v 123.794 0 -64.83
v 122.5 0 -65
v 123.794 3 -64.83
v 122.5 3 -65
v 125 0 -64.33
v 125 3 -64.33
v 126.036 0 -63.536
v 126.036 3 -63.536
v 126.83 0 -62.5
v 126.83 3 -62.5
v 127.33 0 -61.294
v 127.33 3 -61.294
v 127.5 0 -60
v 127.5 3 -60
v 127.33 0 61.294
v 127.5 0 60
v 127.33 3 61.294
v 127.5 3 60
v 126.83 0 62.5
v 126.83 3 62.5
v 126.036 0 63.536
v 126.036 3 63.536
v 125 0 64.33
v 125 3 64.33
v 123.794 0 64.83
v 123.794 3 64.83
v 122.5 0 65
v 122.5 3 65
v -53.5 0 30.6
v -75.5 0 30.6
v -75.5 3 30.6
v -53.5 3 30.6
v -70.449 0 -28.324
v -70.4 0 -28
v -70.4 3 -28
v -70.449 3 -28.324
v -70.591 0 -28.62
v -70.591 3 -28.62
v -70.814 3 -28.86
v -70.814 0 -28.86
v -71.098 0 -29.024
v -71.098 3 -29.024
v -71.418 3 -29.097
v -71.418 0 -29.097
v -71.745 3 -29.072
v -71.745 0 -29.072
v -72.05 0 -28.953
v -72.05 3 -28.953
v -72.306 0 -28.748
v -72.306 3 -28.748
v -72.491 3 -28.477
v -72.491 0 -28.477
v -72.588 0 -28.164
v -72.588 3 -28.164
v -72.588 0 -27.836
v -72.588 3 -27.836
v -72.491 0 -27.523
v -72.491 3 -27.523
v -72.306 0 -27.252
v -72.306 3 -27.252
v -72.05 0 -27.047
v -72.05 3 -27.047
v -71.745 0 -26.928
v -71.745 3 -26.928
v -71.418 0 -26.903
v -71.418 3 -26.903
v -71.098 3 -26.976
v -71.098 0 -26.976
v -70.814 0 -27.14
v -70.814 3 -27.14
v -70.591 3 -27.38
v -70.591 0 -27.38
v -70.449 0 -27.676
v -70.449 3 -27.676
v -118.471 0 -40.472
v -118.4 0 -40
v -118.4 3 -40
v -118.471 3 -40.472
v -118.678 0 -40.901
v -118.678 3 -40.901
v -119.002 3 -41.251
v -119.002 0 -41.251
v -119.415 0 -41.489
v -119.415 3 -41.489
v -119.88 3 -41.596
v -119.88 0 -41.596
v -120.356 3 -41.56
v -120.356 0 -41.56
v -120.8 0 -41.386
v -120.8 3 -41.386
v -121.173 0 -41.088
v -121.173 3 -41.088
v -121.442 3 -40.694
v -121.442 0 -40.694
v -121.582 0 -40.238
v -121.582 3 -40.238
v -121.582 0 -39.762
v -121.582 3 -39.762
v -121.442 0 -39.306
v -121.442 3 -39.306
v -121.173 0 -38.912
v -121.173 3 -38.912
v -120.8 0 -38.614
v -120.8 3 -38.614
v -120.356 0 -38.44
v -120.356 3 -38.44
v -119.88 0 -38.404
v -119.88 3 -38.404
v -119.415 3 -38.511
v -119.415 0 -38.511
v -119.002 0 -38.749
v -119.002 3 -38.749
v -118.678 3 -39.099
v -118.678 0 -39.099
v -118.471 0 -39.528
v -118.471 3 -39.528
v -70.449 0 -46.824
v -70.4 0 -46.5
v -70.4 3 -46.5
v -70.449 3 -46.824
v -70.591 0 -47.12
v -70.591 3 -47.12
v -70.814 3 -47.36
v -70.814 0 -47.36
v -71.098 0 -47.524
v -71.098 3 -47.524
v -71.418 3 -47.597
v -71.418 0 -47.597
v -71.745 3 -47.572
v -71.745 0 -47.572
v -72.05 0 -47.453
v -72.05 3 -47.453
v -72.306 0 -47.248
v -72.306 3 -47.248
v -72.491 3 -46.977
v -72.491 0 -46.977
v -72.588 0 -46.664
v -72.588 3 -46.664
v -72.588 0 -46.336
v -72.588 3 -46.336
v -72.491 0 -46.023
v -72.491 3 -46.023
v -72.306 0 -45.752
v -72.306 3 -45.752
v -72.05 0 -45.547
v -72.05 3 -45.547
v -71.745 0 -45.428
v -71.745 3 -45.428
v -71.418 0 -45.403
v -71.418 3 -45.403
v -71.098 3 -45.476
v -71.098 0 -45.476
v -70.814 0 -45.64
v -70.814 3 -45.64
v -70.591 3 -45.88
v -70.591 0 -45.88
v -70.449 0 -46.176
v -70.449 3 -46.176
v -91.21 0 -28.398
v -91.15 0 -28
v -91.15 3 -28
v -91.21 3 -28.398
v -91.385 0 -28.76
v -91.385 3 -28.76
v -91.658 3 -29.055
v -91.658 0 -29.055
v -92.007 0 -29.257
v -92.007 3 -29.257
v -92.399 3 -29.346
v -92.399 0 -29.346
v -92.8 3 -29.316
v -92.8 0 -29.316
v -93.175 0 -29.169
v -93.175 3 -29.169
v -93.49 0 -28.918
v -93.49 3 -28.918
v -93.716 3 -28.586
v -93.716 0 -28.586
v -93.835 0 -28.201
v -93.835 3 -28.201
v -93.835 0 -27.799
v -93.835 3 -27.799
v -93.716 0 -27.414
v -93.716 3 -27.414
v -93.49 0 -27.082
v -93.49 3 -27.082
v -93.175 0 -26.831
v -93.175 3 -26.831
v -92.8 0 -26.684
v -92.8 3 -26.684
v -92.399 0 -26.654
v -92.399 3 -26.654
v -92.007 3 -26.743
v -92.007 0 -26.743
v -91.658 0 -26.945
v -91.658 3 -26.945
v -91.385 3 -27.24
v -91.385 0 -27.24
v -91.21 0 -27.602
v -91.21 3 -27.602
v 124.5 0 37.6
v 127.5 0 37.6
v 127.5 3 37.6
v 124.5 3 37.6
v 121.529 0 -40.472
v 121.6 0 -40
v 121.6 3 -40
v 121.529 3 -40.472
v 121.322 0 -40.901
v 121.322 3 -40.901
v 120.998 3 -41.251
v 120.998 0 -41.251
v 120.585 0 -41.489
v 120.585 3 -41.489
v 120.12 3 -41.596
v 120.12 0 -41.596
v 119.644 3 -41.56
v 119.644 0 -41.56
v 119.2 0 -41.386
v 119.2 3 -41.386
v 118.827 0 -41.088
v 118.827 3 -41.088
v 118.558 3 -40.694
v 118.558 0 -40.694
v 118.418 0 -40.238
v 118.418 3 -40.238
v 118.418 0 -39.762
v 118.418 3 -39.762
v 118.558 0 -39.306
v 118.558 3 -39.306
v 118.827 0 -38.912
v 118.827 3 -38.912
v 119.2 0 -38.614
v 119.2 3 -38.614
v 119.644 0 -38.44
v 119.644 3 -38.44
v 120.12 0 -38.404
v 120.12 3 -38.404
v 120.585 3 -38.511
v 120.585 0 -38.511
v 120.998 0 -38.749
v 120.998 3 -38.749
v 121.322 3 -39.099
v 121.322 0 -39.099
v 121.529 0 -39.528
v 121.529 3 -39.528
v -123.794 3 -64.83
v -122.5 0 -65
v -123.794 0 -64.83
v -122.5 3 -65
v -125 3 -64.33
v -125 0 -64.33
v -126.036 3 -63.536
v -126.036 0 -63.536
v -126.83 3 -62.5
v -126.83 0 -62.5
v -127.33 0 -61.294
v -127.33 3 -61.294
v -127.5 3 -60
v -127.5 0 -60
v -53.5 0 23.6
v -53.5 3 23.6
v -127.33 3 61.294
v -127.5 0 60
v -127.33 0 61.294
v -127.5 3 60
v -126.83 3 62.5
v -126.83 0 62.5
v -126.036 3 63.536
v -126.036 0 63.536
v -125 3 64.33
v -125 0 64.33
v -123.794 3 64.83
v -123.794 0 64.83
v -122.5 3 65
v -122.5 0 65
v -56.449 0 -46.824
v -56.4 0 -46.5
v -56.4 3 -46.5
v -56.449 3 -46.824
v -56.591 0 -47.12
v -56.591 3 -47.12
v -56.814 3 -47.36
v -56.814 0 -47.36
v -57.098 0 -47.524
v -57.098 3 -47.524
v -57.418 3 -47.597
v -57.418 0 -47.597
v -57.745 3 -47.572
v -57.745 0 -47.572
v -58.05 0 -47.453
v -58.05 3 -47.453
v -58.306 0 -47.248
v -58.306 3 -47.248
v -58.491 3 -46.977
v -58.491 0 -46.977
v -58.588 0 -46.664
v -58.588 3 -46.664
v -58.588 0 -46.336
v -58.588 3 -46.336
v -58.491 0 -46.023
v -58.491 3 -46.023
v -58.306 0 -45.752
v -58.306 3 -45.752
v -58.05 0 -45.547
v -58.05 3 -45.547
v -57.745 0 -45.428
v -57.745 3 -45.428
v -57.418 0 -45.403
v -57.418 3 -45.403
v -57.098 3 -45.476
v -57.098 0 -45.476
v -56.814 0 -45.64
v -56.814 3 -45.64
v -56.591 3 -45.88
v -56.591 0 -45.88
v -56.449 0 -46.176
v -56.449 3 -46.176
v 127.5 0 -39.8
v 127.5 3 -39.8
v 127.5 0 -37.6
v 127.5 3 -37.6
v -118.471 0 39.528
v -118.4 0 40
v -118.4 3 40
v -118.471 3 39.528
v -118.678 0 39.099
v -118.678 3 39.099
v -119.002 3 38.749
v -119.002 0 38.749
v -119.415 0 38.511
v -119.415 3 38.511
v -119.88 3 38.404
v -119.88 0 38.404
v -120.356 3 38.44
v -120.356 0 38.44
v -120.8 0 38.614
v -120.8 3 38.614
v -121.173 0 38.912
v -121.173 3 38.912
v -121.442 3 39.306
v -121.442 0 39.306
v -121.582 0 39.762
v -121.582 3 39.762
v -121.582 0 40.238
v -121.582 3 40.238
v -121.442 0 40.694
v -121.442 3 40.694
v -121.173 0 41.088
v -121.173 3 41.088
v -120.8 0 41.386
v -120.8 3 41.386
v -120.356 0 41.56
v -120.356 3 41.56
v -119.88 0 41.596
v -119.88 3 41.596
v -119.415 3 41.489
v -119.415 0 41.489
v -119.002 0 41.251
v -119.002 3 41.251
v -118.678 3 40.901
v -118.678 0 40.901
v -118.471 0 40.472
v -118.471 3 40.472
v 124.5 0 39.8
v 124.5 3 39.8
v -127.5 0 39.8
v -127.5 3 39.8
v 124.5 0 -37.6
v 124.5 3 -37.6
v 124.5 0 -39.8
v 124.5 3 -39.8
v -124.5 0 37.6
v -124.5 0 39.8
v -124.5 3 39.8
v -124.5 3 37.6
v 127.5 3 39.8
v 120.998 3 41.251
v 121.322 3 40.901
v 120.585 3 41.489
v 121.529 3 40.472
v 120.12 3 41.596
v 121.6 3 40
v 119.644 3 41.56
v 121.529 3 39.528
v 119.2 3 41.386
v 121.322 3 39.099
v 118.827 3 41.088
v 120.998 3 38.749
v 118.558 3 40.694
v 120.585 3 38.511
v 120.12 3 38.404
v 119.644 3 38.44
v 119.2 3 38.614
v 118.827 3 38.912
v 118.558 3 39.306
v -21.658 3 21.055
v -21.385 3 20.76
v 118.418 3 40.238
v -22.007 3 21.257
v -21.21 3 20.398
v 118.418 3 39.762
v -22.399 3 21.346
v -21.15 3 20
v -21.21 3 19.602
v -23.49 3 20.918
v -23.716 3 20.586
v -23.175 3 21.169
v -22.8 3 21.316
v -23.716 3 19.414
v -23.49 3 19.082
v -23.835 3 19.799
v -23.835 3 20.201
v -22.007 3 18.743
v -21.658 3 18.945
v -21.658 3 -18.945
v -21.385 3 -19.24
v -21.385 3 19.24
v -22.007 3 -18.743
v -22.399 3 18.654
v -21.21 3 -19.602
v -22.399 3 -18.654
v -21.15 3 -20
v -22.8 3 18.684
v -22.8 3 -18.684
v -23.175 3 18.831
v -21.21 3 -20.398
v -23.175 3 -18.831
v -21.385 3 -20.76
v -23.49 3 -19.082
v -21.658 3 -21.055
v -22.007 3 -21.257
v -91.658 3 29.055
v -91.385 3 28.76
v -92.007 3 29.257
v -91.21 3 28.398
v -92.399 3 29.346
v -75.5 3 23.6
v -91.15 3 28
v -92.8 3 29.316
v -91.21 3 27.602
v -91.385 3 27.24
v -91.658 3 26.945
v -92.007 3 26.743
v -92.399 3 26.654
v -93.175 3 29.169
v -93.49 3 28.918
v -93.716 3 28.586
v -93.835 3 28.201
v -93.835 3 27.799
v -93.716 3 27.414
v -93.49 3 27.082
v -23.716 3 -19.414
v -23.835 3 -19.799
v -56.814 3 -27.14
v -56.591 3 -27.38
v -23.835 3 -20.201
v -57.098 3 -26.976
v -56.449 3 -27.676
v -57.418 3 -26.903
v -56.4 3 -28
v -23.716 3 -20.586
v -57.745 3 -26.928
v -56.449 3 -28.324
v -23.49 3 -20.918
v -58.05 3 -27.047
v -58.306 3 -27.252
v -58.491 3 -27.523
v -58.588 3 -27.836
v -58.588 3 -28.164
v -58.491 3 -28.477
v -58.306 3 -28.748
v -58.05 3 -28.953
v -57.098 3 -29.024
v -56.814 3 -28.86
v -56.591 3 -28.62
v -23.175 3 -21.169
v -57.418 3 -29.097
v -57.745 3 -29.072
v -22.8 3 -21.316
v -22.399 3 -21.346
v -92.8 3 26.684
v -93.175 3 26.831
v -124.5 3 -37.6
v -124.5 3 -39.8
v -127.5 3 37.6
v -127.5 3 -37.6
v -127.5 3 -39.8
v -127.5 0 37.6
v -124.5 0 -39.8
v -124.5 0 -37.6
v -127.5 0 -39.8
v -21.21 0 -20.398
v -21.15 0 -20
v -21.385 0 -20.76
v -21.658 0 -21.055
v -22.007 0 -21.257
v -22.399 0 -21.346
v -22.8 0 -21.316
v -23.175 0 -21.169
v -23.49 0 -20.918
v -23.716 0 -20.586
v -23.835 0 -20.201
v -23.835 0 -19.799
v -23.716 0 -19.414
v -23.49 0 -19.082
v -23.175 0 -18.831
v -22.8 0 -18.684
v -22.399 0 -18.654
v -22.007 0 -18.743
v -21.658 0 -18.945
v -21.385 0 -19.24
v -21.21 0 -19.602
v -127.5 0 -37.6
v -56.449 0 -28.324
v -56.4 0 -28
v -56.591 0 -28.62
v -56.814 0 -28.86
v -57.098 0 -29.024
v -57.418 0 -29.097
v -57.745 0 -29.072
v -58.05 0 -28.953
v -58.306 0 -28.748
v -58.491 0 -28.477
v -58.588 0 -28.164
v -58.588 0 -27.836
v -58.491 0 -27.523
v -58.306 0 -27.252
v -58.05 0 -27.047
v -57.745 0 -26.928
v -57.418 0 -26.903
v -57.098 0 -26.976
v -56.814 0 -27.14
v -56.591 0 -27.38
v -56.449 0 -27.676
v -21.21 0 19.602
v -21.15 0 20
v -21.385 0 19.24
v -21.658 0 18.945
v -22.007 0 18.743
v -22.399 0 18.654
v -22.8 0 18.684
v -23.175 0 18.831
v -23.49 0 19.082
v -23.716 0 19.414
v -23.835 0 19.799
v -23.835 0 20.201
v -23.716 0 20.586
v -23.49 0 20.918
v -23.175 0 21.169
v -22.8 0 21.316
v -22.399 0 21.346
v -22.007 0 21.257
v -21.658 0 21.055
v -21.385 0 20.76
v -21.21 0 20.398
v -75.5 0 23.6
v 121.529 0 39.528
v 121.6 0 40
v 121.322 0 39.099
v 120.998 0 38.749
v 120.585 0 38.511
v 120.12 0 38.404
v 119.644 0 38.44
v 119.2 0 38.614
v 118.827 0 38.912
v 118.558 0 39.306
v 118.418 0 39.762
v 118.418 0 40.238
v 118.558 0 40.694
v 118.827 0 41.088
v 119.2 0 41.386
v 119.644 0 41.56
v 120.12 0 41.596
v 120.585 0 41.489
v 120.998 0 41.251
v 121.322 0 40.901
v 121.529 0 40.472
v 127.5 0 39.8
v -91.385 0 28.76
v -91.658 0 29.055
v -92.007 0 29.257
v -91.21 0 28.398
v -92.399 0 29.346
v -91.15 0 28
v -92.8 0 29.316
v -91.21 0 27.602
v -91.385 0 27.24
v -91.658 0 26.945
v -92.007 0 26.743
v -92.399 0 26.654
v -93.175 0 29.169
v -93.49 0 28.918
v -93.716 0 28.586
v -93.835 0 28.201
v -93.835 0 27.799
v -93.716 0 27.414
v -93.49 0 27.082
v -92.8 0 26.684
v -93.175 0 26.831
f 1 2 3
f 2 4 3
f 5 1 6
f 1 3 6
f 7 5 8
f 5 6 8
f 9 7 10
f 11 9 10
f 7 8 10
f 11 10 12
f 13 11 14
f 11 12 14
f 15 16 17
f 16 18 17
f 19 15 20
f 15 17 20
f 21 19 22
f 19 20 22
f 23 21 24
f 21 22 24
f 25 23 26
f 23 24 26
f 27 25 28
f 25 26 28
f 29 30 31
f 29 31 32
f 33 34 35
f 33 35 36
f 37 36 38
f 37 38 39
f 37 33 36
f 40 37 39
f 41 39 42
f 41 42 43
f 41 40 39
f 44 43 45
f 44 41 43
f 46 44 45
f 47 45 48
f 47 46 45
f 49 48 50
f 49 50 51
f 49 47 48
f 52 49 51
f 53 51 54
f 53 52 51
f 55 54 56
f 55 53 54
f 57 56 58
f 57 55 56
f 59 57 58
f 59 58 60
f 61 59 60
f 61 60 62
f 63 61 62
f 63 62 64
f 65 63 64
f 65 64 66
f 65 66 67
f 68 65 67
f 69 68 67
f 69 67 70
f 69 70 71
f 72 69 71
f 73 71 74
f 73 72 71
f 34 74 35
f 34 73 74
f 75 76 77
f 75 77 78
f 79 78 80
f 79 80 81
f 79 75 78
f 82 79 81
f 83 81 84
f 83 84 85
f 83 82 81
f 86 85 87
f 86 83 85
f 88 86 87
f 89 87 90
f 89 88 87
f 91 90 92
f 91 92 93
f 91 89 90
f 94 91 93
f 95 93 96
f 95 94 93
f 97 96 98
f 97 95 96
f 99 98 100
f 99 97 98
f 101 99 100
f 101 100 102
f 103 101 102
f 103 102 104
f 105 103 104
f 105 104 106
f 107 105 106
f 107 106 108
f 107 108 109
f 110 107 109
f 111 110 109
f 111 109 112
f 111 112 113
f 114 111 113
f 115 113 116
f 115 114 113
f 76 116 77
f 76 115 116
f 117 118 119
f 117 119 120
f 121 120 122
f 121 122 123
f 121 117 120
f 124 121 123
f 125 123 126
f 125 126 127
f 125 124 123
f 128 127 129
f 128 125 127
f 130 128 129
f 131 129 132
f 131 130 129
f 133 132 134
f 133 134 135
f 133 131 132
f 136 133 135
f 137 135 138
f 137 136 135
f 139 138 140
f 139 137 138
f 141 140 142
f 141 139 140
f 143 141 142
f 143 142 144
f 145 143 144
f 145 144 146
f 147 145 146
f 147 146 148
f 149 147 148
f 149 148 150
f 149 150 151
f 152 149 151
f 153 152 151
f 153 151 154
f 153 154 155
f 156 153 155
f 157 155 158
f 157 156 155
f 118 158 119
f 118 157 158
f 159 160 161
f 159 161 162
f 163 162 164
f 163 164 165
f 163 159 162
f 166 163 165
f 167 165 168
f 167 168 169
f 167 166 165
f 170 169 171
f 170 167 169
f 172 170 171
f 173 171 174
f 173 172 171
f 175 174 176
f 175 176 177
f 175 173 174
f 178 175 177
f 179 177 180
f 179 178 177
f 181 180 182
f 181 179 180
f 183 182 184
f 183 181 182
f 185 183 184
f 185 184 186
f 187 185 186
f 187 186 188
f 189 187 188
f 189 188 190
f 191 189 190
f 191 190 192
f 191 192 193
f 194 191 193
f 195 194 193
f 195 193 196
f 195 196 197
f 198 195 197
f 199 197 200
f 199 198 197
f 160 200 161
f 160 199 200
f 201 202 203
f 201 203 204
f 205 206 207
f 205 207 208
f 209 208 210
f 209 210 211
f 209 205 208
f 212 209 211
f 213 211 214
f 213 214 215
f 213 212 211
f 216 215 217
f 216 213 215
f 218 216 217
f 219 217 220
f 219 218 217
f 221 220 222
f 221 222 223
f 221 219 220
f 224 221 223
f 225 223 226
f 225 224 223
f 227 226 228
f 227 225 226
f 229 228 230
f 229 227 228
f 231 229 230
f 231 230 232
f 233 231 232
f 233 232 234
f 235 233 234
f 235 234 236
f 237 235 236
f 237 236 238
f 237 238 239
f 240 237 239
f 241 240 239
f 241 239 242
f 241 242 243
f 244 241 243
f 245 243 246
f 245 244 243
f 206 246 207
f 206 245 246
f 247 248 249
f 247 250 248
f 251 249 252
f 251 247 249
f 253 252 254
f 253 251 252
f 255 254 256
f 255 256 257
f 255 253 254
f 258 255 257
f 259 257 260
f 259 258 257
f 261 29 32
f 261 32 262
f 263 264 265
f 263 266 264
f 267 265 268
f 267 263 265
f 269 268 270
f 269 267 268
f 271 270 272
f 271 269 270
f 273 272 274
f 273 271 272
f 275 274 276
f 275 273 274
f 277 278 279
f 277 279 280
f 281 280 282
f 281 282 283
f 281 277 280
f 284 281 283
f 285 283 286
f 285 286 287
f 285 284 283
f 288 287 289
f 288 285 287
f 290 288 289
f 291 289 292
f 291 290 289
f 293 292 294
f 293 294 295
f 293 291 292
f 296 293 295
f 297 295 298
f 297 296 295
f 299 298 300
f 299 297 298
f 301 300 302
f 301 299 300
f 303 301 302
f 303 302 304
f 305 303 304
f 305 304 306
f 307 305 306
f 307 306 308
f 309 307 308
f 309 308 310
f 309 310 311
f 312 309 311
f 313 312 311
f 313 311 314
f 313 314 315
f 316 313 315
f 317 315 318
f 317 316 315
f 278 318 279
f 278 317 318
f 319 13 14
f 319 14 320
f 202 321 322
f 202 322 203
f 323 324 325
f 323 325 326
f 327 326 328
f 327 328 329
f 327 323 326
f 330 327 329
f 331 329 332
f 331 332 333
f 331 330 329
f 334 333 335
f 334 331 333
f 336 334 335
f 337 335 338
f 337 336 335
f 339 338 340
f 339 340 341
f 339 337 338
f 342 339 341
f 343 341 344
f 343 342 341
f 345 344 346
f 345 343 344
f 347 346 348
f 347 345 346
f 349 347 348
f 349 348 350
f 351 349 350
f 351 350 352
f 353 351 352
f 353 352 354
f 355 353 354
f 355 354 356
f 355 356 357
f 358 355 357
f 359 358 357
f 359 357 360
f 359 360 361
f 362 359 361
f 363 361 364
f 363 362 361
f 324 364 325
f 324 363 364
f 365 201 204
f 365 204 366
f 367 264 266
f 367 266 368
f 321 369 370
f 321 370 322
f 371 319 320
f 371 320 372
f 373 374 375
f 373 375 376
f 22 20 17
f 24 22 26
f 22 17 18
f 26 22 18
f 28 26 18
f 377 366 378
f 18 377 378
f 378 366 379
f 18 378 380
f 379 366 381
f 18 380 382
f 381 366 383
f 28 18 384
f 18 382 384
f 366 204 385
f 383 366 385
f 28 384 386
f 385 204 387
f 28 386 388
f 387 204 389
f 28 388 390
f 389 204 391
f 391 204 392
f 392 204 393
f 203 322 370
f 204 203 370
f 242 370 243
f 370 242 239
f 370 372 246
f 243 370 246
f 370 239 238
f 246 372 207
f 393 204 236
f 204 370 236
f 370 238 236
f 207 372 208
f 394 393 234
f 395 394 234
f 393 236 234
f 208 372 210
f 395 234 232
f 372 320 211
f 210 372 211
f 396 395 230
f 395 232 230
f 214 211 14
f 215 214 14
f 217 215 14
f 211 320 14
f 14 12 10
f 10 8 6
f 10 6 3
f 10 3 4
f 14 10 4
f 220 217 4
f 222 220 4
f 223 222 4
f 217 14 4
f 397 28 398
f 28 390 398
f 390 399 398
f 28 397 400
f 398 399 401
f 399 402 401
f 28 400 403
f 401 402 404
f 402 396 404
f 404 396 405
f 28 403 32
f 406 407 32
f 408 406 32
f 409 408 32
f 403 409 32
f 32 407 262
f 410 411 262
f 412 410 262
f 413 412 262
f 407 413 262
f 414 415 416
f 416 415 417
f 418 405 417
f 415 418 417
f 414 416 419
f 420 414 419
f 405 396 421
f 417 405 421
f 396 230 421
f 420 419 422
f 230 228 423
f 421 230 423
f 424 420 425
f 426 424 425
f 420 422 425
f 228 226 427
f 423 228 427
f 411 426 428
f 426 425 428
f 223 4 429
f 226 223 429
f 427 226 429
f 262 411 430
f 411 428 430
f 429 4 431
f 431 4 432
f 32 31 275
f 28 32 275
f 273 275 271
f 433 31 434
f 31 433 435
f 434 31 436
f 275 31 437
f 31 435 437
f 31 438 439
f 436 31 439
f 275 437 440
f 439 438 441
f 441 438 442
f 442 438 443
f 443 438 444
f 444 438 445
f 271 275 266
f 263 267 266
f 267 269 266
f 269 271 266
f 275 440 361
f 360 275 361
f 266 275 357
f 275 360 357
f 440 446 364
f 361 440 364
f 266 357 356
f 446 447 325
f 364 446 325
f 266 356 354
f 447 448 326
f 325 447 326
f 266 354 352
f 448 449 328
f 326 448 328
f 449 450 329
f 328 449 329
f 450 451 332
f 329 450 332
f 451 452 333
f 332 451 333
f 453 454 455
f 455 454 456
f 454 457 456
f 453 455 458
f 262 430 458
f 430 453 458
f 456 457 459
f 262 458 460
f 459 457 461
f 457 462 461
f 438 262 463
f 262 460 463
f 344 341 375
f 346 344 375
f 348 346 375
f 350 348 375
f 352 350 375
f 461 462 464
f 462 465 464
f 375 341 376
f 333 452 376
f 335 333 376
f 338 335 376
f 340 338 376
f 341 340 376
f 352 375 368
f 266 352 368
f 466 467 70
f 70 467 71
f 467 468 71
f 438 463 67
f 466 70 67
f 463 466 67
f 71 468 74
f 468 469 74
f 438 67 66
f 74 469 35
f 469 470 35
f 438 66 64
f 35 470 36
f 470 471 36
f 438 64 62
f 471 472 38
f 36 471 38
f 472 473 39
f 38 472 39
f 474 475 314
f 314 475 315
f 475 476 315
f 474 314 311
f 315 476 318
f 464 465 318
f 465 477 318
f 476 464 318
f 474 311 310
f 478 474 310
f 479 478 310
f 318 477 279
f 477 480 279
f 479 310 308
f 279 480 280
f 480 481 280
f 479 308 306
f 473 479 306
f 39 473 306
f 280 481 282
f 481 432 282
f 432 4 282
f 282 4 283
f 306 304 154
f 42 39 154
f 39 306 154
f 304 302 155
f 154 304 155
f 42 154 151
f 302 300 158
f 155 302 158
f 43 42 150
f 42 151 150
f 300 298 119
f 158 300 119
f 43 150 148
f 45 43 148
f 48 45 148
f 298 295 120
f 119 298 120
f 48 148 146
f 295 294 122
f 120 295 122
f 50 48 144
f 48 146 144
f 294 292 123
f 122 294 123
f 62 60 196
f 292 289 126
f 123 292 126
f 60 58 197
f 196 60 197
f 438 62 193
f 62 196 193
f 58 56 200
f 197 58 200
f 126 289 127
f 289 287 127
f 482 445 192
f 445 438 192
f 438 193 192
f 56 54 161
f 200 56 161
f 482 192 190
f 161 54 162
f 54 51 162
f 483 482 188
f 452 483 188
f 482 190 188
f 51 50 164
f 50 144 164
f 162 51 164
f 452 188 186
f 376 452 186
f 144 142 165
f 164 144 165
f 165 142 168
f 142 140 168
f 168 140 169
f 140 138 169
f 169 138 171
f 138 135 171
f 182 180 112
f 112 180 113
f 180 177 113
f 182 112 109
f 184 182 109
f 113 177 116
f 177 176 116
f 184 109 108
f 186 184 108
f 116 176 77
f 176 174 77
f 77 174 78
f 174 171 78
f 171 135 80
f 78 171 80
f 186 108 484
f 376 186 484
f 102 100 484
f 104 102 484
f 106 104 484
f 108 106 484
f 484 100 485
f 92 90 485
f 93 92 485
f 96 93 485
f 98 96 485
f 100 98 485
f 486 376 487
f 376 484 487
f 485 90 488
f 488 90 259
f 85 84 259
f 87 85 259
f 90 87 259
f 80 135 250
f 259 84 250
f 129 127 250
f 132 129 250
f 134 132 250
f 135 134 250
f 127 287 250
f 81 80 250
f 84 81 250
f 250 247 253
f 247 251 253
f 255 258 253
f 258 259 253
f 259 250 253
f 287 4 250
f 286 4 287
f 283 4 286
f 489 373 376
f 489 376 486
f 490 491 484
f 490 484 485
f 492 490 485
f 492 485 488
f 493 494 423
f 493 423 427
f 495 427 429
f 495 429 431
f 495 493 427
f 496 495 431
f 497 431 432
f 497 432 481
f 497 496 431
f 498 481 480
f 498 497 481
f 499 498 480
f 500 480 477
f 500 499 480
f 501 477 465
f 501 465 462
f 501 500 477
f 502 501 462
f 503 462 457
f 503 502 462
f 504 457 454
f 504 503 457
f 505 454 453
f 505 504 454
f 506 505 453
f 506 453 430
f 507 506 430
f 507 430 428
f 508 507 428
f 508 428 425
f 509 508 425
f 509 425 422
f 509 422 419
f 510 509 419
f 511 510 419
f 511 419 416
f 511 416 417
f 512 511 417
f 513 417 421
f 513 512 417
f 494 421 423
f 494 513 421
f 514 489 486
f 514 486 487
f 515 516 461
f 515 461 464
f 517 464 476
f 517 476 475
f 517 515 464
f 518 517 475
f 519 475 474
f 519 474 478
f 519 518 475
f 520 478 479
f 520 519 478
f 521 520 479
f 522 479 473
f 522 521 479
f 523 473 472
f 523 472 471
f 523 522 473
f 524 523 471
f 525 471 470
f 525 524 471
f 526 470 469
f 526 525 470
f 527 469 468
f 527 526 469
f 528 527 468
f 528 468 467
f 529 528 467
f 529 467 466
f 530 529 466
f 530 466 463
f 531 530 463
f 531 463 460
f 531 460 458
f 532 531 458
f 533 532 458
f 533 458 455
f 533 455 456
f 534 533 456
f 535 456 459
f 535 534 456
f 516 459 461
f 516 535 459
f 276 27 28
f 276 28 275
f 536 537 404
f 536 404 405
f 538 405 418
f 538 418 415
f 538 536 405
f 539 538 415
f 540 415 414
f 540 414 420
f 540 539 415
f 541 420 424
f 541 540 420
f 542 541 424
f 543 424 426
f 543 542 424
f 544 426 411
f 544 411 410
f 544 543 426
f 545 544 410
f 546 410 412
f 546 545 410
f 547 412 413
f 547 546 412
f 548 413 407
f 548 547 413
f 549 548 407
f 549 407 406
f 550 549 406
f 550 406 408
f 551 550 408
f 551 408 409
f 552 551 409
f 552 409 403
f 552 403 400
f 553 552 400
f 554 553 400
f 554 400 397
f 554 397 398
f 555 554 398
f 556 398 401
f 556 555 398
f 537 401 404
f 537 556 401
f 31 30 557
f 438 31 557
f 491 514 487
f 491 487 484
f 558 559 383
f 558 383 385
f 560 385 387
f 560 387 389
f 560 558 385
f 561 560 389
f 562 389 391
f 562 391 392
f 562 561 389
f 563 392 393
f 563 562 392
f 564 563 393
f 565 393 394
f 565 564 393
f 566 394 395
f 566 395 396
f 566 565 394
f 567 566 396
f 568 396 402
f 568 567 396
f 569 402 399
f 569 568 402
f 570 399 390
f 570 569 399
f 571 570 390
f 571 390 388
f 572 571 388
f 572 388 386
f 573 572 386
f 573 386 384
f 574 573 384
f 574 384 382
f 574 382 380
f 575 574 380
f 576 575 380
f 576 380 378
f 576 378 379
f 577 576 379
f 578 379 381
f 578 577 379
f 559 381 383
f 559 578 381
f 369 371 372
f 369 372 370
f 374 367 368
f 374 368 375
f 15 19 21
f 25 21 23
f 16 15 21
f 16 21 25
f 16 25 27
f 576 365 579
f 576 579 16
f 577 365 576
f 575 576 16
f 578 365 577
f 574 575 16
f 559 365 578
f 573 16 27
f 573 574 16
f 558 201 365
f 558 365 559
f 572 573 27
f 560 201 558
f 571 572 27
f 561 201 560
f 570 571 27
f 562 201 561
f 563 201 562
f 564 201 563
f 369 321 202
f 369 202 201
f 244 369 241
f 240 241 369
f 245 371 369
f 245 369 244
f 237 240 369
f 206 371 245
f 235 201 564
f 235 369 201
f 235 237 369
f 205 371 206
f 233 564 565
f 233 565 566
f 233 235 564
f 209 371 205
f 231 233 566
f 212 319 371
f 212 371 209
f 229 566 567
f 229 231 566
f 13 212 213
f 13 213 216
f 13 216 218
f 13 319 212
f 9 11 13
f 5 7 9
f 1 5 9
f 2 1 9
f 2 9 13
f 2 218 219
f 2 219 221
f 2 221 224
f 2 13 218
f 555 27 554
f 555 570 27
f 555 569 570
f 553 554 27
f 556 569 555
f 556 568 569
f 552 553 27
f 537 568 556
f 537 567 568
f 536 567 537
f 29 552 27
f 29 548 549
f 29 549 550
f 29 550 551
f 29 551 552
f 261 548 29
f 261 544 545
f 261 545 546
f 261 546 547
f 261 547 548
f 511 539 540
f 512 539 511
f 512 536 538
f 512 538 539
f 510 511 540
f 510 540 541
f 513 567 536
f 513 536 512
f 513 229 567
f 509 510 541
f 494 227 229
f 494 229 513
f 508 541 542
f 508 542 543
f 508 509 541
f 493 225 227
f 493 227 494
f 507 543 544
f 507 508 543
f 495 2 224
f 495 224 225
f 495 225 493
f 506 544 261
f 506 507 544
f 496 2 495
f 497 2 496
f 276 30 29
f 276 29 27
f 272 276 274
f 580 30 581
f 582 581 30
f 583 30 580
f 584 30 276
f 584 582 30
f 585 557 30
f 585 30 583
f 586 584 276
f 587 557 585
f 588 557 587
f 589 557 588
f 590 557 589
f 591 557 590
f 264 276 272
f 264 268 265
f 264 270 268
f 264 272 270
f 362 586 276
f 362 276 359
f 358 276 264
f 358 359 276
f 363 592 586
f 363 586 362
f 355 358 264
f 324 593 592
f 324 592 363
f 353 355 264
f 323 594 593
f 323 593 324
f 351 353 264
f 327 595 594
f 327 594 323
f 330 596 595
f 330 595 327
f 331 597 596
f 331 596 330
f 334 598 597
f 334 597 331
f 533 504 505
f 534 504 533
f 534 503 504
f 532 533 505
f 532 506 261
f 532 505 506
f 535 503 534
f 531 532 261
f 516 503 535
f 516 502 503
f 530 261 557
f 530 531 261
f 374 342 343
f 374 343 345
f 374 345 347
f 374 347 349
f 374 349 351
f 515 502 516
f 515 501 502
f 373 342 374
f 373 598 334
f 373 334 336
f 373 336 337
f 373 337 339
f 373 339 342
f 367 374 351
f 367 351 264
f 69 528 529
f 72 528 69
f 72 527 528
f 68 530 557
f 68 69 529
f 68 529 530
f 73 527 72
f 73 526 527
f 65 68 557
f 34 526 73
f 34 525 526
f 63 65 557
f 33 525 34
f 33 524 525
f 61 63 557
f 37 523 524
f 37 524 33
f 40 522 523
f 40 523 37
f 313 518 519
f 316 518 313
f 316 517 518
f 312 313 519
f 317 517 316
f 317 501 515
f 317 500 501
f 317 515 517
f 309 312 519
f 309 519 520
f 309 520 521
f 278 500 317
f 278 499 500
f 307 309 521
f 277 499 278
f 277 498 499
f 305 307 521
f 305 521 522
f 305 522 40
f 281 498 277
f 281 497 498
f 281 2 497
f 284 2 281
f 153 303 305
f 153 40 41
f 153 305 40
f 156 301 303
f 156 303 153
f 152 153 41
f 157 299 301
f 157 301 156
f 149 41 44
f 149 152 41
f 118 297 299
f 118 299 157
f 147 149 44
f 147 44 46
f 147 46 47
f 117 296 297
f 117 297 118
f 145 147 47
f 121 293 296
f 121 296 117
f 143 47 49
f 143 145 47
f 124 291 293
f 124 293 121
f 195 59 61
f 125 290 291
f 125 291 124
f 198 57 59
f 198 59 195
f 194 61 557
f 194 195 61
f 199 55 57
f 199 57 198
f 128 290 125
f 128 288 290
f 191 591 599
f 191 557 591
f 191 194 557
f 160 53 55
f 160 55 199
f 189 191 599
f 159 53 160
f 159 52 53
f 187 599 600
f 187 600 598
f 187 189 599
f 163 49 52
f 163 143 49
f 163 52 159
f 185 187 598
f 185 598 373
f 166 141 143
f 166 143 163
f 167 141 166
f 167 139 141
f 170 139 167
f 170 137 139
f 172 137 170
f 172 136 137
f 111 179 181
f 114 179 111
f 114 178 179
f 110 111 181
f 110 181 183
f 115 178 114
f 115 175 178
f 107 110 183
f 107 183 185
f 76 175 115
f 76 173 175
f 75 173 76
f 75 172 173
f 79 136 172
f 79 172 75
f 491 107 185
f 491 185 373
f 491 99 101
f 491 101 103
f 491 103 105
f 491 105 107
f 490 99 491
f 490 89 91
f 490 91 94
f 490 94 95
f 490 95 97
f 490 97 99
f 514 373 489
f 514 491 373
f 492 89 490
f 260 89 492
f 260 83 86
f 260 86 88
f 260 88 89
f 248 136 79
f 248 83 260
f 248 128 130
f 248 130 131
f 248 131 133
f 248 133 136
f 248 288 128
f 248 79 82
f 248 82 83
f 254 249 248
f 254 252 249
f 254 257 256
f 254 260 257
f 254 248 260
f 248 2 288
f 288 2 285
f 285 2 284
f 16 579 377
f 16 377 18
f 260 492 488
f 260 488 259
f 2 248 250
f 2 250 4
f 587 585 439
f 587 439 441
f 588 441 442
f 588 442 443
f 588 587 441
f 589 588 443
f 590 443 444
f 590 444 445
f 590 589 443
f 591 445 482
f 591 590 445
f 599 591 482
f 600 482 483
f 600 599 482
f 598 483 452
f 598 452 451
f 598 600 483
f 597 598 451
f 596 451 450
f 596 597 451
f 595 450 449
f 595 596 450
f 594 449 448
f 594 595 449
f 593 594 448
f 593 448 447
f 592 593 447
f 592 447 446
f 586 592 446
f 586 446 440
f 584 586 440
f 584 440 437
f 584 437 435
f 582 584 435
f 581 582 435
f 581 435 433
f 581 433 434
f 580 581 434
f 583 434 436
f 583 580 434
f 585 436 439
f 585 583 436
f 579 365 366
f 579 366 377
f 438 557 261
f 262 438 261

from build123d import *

# Parameters (mm, degrees)
SKETCH1_R           = 1.35
SKETCH1_R_2         = 1.6
SKETCH1_R_3         = 1.1
SKETCH1_W           = 22
SKETCH1_H           = 7
BOSS_EXTRUDE1_DEPTH = 3
FILLET1_R           = 5


with BuildPart() as part:
    # Sketch1 → Boss-Extrude1 (new body)
    with BuildSketch(Plane(origin=(0, 0, 0), x_dir=(1, 0, 0), z_dir=(0, 1, 0))):
        Polygon((-127.5, 65), (127.5, 65), (127.5, 39.8), (124.5, 39.8), (124.5, 37.6), (127.5, 37.6), (127.5, -37.6), (124.5, -37.6), (124.5, -39.8), (127.5, -39.8), (127.5, -65), (-127.5, -65), (-127.5, -39.8), (-124.5, -39.8), (-124.5, -37.6), (-127.5, -37.6), (-127.5, 37.6), (-124.5, 37.6), (-124.5, 39.8), (-127.5, 39.8), align=None)
        with Locations((-92.5, 28)):
            Circle(SKETCH1_R, mode=Mode.SUBTRACT)
        with Locations((-22.5, 20)):
            Circle(SKETCH1_R, mode=Mode.SUBTRACT)
        with Locations((-92.5, -28)):
            Circle(SKETCH1_R, mode=Mode.SUBTRACT)
        with Locations((-22.5, -20)):
            Circle(SKETCH1_R, mode=Mode.SUBTRACT)
        with Locations((-120, 40)):
            Circle(SKETCH1_R_2, mode=Mode.SUBTRACT)
        with Locations((120, 40)):
            Circle(SKETCH1_R_2, mode=Mode.SUBTRACT)
        with Locations((120, -40)):
            Circle(SKETCH1_R_2, mode=Mode.SUBTRACT)
        with Locations((-120, -40)):
            Circle(SKETCH1_R_2, mode=Mode.SUBTRACT)
        with Locations((-71.5, 46.5)):
            Circle(SKETCH1_R_3, mode=Mode.SUBTRACT)
        with Locations((-71.5, 28)):
            Circle(SKETCH1_R_3, mode=Mode.SUBTRACT)
        with Locations((-57.5, 46.5)):
            Circle(SKETCH1_R_3, mode=Mode.SUBTRACT)
        with Locations((-57.5, 28)):
            Circle(SKETCH1_R_3, mode=Mode.SUBTRACT)
        with Locations((-64.5, -27.1)):
            Rectangle(SKETCH1_W, SKETCH1_H, mode=Mode.SUBTRACT)
    extrude(amount=BOSS_EXTRUDE1_DEPTH)

    # Fillet1
    fillet1_edges = [part.edges().sort_by_distance(p)[0] for p in [
        (127.5, 1.5, 65),
        (-127.5, 1.5, 65),
        (-127.5, 1.5, -65),
        (127.5, 1.5, -65),
    ]]
    fillet(fillet1_edges, radius=FILLET1_R)


solid = part.part
